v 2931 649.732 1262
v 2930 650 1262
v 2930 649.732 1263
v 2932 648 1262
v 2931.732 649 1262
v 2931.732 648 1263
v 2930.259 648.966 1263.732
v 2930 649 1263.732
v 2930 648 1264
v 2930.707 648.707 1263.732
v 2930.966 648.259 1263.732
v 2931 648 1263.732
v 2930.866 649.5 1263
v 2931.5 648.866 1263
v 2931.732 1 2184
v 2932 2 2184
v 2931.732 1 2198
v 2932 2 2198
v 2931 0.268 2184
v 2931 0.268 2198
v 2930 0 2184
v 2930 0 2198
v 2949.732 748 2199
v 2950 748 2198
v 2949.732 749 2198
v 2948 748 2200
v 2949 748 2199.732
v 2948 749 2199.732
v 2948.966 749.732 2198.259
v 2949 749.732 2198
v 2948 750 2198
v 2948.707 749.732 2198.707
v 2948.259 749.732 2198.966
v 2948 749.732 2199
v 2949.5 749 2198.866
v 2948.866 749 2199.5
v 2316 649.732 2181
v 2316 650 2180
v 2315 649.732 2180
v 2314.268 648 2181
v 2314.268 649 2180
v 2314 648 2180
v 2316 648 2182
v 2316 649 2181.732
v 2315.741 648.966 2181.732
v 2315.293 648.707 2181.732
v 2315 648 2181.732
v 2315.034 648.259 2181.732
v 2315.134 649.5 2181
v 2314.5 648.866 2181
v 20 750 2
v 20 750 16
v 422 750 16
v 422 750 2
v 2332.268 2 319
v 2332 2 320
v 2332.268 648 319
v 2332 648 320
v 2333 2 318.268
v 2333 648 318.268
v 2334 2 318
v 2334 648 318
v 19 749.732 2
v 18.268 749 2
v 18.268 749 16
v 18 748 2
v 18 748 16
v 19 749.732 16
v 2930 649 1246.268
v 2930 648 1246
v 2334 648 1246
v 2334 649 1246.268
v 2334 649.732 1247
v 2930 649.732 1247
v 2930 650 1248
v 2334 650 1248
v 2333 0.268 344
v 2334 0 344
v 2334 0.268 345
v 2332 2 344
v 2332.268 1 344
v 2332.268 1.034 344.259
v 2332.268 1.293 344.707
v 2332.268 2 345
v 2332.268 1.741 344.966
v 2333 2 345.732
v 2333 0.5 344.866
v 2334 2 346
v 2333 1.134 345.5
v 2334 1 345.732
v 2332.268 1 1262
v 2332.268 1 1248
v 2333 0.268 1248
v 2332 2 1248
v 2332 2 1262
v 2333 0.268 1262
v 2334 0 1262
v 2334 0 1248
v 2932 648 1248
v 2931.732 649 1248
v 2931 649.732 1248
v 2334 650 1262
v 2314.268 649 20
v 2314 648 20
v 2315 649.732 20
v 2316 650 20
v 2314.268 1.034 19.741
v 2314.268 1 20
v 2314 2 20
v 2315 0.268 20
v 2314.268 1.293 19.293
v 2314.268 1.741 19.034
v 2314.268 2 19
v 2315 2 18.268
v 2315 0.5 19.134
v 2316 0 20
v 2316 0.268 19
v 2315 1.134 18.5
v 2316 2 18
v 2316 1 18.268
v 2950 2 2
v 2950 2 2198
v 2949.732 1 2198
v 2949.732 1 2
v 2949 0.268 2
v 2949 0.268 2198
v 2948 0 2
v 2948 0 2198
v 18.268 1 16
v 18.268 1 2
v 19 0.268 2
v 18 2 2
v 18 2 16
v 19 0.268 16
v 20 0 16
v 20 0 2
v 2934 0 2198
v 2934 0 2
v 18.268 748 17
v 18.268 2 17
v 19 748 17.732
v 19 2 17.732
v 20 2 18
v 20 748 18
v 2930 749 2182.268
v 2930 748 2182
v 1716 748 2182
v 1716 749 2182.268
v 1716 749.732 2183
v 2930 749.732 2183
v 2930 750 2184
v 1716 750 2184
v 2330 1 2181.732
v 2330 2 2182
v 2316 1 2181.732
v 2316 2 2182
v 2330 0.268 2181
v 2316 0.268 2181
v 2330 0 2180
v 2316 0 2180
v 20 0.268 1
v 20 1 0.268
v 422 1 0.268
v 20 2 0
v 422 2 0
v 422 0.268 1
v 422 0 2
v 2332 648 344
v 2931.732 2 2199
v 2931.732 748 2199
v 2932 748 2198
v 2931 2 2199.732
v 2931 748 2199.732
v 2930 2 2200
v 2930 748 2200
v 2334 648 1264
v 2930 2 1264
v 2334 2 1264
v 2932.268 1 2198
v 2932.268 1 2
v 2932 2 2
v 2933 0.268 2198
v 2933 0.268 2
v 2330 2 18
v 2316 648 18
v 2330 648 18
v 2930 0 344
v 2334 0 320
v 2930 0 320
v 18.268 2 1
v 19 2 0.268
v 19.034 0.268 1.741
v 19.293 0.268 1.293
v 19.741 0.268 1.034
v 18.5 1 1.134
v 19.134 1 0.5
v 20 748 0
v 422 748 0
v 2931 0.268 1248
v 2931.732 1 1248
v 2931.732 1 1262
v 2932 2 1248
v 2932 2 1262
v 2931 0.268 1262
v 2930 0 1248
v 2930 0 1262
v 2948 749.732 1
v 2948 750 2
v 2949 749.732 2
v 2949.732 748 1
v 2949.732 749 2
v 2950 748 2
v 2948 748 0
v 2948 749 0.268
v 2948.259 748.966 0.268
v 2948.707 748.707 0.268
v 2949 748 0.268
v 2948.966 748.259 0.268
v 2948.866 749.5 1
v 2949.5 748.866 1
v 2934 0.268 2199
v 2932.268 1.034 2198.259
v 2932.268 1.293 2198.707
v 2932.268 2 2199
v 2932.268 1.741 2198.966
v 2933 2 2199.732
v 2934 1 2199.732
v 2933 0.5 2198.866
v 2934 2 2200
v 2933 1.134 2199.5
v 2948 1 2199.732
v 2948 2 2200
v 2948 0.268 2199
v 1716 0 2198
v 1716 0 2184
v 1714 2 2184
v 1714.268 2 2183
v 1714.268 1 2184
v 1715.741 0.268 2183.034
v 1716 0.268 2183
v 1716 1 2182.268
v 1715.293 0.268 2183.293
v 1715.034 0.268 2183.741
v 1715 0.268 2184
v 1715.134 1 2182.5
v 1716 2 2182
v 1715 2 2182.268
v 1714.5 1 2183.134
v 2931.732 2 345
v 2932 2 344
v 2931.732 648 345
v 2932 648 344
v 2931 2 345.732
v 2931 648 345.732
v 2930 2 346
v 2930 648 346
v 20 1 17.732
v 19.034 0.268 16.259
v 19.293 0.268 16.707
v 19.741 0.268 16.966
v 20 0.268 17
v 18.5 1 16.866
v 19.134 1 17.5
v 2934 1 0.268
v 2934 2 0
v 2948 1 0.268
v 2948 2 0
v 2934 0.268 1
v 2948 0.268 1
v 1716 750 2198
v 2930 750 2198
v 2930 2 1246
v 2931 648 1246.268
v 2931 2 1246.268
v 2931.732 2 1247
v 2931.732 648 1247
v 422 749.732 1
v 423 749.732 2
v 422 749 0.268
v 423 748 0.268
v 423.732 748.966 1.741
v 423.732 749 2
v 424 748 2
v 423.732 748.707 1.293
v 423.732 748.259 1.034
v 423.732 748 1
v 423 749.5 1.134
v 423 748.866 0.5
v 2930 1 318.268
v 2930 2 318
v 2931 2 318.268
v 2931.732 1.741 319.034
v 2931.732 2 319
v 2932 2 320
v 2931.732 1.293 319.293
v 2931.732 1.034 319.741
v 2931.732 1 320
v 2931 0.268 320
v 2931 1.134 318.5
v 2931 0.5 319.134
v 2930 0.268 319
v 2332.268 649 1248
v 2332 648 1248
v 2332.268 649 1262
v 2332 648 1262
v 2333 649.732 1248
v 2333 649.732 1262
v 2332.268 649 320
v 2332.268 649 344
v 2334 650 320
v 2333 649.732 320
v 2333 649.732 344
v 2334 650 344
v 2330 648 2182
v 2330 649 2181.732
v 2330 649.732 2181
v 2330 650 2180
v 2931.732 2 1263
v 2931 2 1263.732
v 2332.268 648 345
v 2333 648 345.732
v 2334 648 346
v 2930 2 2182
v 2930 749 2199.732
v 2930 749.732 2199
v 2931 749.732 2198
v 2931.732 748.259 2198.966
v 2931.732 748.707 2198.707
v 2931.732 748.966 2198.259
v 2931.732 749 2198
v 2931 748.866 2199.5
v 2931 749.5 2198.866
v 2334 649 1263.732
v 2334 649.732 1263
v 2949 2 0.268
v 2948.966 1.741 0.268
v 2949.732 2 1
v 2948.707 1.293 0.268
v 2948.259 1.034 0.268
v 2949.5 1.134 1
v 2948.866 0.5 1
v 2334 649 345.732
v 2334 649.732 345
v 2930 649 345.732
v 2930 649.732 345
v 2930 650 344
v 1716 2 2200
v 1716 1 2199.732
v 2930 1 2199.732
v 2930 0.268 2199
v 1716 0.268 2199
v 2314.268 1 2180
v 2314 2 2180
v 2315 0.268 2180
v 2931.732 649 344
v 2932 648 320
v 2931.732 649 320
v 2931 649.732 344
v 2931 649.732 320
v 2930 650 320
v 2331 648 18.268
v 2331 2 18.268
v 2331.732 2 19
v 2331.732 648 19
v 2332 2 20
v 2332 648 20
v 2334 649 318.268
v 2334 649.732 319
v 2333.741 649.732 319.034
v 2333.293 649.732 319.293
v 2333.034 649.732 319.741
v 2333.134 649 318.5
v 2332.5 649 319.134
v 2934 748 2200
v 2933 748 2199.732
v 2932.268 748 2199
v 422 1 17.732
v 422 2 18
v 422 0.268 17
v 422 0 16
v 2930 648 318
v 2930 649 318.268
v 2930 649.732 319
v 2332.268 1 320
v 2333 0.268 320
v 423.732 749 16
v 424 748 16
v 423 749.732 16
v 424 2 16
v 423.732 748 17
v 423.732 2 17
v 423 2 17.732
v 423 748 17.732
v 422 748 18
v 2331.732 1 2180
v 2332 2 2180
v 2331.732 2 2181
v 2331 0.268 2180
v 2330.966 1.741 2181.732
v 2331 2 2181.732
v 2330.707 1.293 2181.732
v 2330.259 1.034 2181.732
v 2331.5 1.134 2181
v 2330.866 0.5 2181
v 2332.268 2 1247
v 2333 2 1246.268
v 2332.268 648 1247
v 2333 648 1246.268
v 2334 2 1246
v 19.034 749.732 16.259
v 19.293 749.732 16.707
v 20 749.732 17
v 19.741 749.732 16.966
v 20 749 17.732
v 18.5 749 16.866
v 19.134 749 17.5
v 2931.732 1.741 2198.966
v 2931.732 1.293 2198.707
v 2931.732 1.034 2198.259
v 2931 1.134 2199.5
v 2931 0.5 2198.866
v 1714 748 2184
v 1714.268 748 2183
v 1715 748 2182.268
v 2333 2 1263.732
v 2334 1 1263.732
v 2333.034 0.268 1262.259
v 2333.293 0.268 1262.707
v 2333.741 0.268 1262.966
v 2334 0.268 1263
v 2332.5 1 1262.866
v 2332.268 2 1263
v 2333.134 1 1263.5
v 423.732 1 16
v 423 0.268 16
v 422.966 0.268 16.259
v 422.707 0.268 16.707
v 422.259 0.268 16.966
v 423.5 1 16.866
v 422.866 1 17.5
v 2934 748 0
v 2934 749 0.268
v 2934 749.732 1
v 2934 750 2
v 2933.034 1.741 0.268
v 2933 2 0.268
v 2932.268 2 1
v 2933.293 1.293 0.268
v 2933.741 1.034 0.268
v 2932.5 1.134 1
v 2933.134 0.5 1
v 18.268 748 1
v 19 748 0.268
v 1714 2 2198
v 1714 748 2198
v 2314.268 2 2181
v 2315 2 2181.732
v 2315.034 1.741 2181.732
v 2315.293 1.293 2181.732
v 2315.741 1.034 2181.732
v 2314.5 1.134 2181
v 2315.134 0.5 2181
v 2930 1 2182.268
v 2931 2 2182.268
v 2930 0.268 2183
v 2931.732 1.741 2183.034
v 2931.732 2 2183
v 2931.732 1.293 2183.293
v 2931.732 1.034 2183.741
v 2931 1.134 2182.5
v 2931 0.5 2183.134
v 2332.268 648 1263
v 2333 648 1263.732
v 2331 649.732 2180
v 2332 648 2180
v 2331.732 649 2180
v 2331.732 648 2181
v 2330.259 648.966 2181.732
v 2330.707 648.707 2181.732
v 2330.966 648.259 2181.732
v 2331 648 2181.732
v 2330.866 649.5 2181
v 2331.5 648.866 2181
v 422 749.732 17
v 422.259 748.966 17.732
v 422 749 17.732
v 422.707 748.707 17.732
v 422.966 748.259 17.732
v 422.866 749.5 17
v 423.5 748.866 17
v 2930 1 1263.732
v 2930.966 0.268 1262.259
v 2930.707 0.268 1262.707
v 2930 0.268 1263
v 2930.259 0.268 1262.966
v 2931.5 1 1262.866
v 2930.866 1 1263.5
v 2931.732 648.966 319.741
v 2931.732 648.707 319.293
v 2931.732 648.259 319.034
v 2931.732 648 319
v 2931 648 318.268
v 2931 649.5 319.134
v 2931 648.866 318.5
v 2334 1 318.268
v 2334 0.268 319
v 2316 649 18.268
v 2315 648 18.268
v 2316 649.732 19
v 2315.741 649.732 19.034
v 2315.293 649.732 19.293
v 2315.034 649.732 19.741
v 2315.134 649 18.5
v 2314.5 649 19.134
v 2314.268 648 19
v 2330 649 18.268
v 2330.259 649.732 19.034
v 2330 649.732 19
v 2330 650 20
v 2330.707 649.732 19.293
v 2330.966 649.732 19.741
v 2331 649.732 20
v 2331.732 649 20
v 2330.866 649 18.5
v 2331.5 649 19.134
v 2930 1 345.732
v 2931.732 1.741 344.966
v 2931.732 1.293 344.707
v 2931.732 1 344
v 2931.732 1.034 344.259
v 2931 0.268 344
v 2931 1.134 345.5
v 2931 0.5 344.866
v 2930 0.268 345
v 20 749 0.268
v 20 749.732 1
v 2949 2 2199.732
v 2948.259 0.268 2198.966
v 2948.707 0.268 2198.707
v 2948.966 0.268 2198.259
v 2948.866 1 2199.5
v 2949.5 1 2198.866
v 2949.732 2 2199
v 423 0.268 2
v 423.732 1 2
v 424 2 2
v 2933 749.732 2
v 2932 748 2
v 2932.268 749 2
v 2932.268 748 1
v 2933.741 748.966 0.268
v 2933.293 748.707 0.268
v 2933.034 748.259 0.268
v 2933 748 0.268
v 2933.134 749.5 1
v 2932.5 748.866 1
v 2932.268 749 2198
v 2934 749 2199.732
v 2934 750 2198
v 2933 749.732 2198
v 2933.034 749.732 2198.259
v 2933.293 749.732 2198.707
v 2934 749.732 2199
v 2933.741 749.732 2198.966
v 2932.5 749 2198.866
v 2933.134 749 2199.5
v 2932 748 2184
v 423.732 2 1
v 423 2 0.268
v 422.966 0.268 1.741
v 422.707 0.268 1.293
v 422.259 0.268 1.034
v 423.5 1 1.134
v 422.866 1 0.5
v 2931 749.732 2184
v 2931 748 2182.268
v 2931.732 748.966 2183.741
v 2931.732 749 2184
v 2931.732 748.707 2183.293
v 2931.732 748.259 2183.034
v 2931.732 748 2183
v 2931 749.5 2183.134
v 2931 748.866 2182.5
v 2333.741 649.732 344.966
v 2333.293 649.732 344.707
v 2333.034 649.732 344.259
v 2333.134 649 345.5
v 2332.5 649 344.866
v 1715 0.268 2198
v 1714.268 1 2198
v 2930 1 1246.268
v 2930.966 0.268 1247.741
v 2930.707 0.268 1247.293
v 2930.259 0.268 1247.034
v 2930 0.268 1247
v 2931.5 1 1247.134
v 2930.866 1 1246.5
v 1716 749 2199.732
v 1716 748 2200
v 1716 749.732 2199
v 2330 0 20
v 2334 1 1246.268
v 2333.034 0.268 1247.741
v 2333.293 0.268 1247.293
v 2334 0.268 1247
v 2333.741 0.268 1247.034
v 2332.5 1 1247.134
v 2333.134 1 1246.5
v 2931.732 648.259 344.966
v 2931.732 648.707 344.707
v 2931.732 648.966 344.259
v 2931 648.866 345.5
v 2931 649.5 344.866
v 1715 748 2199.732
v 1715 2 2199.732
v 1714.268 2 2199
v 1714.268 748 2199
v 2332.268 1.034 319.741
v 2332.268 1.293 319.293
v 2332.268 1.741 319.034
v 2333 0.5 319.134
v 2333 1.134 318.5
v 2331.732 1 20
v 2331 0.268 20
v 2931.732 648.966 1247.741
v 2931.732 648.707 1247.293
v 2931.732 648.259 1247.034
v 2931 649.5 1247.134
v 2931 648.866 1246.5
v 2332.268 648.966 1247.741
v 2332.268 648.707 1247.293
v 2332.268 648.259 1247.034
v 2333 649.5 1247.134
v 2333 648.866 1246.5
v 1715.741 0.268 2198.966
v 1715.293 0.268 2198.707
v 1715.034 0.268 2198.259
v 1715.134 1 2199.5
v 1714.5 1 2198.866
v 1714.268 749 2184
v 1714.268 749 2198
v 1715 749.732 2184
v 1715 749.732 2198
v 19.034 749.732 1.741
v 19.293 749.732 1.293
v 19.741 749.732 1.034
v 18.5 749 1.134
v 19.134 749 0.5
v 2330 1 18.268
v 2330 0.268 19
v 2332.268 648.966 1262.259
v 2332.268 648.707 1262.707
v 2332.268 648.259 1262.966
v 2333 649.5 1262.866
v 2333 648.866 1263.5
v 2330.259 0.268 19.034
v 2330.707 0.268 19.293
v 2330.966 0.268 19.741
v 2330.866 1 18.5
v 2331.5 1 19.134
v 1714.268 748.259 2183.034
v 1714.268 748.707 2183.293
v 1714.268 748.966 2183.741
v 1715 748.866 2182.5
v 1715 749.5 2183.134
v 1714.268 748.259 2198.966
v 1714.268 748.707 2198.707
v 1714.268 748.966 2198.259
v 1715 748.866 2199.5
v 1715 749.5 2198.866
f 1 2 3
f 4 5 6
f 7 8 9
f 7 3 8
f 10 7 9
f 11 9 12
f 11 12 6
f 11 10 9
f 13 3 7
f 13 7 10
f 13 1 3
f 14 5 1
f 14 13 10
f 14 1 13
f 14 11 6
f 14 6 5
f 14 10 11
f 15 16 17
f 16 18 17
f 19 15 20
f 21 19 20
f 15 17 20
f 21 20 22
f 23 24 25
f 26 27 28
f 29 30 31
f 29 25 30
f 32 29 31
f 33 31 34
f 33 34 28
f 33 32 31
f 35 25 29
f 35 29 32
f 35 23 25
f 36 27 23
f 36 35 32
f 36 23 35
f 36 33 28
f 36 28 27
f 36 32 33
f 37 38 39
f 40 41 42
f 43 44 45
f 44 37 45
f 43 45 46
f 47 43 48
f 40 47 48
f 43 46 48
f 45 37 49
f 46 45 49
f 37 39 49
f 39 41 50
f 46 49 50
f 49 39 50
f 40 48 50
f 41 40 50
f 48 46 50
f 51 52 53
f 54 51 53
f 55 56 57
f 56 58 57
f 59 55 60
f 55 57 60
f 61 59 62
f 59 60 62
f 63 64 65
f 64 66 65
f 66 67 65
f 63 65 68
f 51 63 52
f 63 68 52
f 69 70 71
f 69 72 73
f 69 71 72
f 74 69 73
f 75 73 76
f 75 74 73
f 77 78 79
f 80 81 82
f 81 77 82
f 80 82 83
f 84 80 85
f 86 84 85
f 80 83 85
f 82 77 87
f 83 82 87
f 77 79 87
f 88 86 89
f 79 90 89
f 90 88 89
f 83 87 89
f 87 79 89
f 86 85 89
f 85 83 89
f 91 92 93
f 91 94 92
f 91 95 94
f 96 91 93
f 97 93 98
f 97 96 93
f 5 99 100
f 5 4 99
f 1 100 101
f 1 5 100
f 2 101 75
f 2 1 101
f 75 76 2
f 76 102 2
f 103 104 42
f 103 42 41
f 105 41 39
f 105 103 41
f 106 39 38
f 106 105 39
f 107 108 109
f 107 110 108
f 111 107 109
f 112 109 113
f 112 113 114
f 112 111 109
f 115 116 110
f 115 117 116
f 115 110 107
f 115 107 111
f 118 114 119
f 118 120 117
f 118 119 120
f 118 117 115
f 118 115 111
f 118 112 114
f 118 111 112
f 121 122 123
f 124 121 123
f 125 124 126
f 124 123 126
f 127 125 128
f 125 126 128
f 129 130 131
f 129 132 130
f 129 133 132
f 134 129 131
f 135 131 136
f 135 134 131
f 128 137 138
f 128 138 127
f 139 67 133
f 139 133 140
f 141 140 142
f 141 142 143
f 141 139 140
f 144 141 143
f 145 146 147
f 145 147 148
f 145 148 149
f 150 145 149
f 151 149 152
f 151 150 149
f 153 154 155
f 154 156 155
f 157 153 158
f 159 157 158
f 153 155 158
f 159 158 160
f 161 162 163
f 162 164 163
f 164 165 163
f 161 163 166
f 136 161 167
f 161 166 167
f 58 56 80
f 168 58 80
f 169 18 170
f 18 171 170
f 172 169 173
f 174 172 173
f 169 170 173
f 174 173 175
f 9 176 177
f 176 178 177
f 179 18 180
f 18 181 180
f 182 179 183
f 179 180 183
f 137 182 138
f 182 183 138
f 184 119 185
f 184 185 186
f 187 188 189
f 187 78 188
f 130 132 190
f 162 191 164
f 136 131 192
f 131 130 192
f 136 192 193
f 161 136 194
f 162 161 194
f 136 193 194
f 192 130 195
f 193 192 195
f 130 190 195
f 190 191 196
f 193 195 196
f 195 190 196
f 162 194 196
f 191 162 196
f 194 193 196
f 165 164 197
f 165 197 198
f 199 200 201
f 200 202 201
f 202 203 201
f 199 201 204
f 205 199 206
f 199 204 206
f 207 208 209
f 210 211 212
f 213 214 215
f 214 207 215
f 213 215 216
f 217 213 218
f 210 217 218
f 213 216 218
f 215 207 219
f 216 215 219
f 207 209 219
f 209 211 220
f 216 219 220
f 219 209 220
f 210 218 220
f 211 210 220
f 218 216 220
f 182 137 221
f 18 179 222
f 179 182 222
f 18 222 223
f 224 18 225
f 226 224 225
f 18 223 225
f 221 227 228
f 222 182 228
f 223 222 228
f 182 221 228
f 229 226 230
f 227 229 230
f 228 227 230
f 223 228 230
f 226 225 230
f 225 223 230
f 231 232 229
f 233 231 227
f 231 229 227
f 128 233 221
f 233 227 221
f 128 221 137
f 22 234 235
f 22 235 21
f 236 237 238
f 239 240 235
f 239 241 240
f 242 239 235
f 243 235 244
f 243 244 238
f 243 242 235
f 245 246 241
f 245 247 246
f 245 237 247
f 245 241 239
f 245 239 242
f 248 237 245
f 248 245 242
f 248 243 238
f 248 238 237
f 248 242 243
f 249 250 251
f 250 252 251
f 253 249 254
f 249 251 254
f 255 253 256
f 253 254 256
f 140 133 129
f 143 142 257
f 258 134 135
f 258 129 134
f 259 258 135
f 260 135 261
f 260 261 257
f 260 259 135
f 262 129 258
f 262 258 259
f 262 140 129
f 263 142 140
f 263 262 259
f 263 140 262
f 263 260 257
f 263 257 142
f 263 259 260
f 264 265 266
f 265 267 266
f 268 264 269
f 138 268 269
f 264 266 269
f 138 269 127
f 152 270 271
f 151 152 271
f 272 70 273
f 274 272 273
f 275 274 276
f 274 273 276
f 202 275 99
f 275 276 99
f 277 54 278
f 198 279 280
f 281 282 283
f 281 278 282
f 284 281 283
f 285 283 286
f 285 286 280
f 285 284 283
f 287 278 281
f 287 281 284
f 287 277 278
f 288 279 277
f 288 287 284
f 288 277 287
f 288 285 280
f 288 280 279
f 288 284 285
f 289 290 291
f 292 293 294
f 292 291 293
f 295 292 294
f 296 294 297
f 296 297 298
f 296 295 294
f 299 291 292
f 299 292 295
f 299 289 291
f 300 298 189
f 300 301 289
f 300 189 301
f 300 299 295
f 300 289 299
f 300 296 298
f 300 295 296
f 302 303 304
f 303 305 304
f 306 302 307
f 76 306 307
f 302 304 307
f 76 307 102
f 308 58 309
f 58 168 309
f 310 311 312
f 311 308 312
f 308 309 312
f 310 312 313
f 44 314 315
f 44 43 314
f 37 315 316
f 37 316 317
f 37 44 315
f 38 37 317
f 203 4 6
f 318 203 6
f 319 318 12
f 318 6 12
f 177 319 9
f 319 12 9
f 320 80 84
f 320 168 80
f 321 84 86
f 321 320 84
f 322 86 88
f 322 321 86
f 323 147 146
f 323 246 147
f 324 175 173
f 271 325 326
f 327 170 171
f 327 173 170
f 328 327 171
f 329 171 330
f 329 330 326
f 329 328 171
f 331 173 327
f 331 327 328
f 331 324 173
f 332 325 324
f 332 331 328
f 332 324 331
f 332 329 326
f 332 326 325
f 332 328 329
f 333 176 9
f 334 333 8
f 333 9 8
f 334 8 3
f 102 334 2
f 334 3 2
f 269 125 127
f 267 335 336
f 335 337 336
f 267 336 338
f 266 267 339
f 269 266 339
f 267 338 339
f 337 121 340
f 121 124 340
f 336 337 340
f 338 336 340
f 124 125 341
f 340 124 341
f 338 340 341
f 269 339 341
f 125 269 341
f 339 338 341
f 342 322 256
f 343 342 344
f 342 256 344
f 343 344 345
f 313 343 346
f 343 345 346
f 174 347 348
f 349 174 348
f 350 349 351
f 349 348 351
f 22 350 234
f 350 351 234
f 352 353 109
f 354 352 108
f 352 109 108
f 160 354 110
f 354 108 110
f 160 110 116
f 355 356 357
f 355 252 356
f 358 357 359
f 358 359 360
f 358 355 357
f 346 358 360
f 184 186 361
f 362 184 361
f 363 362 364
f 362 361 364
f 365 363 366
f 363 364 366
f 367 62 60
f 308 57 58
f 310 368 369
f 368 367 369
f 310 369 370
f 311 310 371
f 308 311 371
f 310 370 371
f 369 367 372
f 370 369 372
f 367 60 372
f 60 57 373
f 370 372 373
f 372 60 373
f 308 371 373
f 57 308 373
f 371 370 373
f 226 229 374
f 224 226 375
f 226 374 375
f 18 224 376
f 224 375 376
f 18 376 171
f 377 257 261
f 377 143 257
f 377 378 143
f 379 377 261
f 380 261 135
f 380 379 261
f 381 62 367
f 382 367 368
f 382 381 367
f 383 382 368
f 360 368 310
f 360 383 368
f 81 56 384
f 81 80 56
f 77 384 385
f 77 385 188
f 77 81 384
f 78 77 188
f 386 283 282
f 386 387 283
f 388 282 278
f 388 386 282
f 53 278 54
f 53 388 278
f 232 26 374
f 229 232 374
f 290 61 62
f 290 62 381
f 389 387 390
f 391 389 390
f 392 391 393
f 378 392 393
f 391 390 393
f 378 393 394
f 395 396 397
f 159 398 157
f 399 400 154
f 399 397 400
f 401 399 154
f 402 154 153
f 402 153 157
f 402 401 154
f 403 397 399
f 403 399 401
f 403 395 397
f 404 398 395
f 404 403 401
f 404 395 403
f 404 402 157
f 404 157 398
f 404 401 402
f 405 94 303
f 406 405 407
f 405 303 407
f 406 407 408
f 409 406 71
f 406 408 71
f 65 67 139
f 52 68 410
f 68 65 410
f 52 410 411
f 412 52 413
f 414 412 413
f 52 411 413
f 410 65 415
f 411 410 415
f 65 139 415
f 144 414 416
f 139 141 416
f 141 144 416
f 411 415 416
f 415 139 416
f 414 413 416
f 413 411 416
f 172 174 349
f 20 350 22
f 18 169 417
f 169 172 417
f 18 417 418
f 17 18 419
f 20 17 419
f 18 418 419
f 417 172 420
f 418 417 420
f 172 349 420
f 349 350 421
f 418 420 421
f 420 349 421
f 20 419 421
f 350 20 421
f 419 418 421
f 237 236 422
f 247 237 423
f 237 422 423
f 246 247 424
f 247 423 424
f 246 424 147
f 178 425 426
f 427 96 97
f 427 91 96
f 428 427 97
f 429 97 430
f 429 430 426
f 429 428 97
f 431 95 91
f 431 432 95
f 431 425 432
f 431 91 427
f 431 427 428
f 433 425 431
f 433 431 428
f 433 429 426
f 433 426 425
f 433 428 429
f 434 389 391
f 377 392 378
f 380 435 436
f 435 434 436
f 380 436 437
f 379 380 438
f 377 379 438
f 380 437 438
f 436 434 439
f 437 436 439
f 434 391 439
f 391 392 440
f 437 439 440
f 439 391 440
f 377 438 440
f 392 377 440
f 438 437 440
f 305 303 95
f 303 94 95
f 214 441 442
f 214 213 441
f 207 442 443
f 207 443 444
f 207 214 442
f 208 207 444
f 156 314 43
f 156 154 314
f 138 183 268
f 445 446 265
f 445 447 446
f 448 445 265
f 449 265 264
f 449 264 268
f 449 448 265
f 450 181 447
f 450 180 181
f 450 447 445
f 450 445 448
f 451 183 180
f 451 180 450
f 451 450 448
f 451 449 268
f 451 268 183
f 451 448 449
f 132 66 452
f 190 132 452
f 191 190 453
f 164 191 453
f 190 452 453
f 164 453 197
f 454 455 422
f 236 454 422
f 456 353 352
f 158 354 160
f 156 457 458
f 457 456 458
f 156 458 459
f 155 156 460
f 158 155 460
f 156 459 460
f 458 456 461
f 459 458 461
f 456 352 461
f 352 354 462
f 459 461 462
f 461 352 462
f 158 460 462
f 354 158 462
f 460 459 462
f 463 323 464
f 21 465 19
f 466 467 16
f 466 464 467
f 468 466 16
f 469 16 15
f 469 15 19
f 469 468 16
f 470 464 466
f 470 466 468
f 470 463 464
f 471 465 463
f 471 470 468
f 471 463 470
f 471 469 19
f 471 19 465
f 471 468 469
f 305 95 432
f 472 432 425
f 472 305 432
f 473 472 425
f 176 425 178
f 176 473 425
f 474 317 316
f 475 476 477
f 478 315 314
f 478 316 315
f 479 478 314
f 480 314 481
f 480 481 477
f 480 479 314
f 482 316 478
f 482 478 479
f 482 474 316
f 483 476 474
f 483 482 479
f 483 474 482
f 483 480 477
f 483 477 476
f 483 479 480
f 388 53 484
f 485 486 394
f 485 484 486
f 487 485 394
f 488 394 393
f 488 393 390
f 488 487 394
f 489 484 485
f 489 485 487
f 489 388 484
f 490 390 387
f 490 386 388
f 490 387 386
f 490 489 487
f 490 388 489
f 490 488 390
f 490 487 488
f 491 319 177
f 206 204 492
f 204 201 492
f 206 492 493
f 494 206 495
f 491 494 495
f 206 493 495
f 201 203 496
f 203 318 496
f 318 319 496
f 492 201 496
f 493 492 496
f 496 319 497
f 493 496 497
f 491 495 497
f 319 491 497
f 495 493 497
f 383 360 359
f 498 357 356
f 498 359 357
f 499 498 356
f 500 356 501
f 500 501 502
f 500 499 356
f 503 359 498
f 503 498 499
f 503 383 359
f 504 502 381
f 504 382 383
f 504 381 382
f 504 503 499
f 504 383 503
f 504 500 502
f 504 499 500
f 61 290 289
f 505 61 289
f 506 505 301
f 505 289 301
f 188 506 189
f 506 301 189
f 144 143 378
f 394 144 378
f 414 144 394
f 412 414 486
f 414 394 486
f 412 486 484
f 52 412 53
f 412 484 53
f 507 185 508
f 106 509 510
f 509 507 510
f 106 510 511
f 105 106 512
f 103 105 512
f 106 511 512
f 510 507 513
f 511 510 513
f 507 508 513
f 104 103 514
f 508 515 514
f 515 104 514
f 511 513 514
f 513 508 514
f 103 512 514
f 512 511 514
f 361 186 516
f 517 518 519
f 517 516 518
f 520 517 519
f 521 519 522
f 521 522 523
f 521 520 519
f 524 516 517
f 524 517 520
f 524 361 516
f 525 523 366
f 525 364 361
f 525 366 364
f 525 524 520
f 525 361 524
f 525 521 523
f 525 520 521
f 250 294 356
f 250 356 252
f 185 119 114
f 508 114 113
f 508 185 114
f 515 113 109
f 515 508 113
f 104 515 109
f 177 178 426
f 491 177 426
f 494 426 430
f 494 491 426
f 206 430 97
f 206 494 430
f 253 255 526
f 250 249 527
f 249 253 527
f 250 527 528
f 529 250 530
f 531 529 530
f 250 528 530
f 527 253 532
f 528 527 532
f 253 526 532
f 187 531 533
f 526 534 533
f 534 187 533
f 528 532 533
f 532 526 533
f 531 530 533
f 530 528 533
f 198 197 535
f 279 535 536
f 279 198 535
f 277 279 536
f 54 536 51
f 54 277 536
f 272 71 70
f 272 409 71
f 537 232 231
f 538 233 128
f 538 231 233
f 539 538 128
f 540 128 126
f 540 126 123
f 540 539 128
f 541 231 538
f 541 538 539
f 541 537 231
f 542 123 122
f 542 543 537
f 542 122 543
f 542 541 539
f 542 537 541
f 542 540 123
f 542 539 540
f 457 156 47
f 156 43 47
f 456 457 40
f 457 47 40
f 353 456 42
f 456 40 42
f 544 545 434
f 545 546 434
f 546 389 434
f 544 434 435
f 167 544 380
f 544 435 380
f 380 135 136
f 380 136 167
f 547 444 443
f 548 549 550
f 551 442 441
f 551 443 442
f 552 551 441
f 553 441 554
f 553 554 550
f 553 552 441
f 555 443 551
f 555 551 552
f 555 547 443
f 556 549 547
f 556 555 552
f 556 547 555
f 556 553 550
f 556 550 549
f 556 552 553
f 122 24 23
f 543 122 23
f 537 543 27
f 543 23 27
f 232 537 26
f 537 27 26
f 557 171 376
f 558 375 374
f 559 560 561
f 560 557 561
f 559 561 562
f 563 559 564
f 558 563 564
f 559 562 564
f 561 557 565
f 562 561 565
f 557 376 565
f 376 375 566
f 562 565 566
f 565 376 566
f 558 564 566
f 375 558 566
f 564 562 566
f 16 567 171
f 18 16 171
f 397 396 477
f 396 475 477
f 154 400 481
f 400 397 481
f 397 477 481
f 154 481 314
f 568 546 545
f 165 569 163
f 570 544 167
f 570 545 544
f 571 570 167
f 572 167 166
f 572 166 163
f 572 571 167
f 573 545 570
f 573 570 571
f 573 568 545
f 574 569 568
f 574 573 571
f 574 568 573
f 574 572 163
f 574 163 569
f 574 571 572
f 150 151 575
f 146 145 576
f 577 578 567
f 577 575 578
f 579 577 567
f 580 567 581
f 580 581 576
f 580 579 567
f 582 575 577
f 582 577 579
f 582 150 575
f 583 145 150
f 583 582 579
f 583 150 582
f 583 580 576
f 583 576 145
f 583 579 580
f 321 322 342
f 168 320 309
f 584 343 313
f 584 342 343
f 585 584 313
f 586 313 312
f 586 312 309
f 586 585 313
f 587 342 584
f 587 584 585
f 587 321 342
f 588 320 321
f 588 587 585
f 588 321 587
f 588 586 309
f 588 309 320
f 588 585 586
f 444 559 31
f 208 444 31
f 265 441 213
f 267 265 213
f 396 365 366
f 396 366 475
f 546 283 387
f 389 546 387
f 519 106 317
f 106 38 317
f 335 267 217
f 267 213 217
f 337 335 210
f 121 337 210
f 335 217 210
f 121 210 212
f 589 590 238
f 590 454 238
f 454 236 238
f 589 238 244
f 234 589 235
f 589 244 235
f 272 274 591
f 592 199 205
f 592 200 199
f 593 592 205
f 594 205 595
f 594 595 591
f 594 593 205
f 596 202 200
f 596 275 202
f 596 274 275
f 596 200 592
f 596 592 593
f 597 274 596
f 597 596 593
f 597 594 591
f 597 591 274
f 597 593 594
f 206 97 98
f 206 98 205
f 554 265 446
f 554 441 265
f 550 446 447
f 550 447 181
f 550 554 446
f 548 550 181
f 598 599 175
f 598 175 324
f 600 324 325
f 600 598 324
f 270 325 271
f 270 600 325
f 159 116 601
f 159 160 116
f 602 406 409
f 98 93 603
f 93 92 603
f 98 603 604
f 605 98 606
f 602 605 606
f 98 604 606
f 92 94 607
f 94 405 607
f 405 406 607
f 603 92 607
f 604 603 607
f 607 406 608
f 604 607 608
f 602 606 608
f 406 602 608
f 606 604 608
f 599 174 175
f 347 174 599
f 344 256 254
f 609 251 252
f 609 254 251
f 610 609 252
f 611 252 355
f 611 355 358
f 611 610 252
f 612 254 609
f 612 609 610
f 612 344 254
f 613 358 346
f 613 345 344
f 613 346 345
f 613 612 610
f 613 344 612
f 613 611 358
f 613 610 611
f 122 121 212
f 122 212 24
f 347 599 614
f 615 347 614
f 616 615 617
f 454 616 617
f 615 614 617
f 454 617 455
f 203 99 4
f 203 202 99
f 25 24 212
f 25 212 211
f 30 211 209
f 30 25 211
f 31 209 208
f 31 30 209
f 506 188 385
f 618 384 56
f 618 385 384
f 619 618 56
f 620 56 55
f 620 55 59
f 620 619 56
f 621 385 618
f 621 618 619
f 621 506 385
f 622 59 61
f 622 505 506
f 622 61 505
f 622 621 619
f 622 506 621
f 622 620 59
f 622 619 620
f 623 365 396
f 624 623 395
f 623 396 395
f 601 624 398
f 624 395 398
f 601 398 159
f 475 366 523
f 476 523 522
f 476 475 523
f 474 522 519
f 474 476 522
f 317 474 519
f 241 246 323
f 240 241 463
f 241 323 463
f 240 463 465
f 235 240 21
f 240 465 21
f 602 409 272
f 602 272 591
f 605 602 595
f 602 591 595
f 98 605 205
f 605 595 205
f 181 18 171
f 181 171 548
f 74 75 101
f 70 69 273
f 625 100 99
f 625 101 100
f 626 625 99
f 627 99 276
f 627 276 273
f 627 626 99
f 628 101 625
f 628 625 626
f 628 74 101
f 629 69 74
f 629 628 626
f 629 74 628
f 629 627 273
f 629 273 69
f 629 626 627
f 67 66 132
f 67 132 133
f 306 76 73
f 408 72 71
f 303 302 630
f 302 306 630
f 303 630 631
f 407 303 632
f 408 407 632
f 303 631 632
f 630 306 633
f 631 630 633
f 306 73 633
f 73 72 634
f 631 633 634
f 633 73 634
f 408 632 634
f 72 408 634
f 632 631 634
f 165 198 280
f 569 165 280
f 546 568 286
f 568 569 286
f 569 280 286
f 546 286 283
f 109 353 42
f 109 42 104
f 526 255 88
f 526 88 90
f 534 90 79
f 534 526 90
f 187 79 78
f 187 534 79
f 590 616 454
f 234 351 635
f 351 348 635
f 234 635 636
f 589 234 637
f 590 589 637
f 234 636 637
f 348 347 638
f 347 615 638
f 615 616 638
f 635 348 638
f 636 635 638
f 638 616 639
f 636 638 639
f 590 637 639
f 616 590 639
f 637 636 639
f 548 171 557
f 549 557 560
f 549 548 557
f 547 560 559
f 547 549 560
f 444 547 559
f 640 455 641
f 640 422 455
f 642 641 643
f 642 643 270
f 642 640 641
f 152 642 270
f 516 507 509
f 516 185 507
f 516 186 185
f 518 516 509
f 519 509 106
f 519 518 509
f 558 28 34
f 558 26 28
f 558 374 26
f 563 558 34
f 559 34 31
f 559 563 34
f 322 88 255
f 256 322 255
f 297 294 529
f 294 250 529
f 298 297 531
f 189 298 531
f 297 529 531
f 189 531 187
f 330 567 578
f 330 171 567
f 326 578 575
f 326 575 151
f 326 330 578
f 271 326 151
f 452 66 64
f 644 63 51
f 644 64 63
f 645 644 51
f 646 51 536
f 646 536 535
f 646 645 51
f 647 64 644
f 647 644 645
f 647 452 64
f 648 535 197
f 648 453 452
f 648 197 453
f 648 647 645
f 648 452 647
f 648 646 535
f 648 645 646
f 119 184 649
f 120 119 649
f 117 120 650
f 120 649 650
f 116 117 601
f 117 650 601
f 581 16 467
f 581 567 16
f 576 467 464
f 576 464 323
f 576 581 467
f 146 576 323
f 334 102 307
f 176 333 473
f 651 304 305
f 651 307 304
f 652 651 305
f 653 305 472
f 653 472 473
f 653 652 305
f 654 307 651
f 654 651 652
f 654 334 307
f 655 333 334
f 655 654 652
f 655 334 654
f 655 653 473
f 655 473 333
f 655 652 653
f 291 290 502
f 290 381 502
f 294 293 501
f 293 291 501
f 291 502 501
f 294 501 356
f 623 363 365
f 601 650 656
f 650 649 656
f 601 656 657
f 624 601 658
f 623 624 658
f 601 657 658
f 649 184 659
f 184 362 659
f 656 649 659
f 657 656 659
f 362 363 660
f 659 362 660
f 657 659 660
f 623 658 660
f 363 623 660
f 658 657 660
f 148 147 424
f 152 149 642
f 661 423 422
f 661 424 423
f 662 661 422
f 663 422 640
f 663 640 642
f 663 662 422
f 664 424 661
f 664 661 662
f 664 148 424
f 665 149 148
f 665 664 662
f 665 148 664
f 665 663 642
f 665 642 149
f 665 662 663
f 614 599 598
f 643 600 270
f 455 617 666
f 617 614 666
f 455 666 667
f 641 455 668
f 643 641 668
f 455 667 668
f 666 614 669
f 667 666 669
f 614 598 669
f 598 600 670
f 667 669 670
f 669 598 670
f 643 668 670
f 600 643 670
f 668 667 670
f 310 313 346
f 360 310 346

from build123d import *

# Parameters (mm, degrees)
F1_DEPTH = 750
F0_W     = 600
F0_H     = 28
F2_DEPTH = 650
F0_H_2   = 18
F3_DEPTH = 650
F4_DEPTH = 750
F5_DEPTH = 650
F0_W_2   = 406
F6_DEPTH = 750
F7_R     = 2
F8_R     = 2
F8_2_R   = 2
F9_R     = 2
F10_R    = 2
F11_R    = 2


with BuildPart() as f1:
    # F0 (on Front) → F1 (new body)
    with BuildSketch(Plane.XZ):
        Polygon((2932, 0), (2950, 0), (2950, 2200), (2932, 2200), (2932, 2182), (2932, 1362), (2932, 1344), (2932, 1264), (2932, 1246), (2932, 346), (2932, 318), (2932, 18), align=None)
    extrude(amount=-F1_DEPTH)

    # F8
    f8_edges = [f1.edges().sort_by_distance(p)[0] for p in [
        (2950, 375, 2200),
        (2941, 0, 2200),
        (2950, 0, 1100),
        (2932, 0, 1100),
        (2932, 375, 2200),
        (2950, 750, 1100),
        (2932, 750, 1100),
        (2941, 750, 2200),
        (2941, 750, 0),
        (2950, 375, 0),
        (2932, 375, 0),
        (2941, 0, 0),
    ]]
    fillet(f8_edges, radius=F8_R)


with BuildPart() as f2:
    # F0 (on Front) → F2 (new body)
    with BuildSketch(Plane.XZ):
        with Locations((2632, 332)):
            Rectangle(F0_W, F0_H)
    extrude(amount=-F2_DEPTH)

    # F9
    f9_edges = [f2.edges().sort_by_distance(p)[0] for p in [
        (2632, 0, 318),
        (2632, 0, 346),
        (2332, 0, 332),
        (2332, 325, 346),
        (2332, 325, 318),
        (2632, 650, 346),
        (2632, 650, 318),
        (2332, 650, 332),
        (2932, 325, 346),
        (2932, 650, 332),
        (2932, 325, 318),
        (2932, 0, 332),
    ]]
    fillet(f9_edges, radius=F9_R)


with BuildPart() as f3:
    # F0 (on Front) → F3 (new body)
    with BuildSketch(Plane.XZ):
        with Locations((2632, 1255)):
            Rectangle(F0_W, F0_H_2)
    extrude(amount=-F3_DEPTH)

    # F10
    f10_edges = [f3.edges().sort_by_distance(p)[0] for p in [
        (2632, 650, 1246),
        (2932, 650, 1255),
        (2632, 650, 1264),
        (2332, 650, 1255),
        (2932, 325, 1246),
        (2932, 325, 1264),
        (2932, 0, 1255),
        (2332, 325, 1264),
        (2332, 325, 1246),
        (2332, 0, 1255),
        (2632, 0, 1246),
        (2632, 0, 1264),
    ]]
    fillet(f10_edges, radius=F10_R)


with BuildPart() as f4:
    # F0 (on Front) → F4 (new body)
    with BuildSketch(Plane.XZ):
        Polygon((2932, 2182), (2932, 2200), (1714, 2200), (1714, 2182), (2314, 2182), (2332, 2182), align=None)
    extrude(amount=-F4_DEPTH)

    # F7
    f7_edges = [f4.edges().sort_by_distance(p)[0] for p in [
        (2323, 750, 2200),
        (1714, 375, 2200),
        (2323, 750, 2182),
        (1714, 375, 2182),
        (2323, 0, 2200),
        (2323, 0, 2182),
        (1714, 0, 2191),
        (1714, 750, 2191),
        (2932, 375, 2200),
        (2932, 750, 2191),
        (2932, 375, 2182),
        (2932, 0, 2191),
    ]]
    fillet(f7_edges, radius=F7_R)


with BuildPart() as f5:
    # F0 (on Front) → F5 (new body)
    with BuildSketch(Plane.XZ):
        Polygon((2314, 18), (2332, 18), (2332, 318), (2332, 346), (2332, 1246), (2332, 1264), (2332, 1344), (2332, 1362), (2332, 2182), (2314, 2182), (2314, 1362), (2314, 1344), (2314, 1264), (2314, 1246), (2314, 346), (2314, 318), align=None)
    extrude(amount=-F5_DEPTH)

    # F8#2
    f8_2_edges = [f5.edges().sort_by_distance(p)[0] for p in [
        (2332, 325, 18),
        (2323, 0, 18),
        (2314, 0, 1100),
        (2314, 325, 18),
        (2332, 0, 1100),
        (2323, 650, 18),
        (2314, 650, 1100),
        (2332, 650, 1100),
        (2323, 650, 2182),
        (2314, 325, 2182),
        (2332, 325, 2182),
        (2323, 0, 2182),
    ]]
    fillet(f8_2_edges, radius=F8_2_R)


with BuildPart() as f6:
    # F0 (on Front) → F6 (new body)
    with BuildSketch(Plane.XZ):
        with Locations((221, 9)):
            Rectangle(F0_W_2, F0_H_2)
    extrude(amount=-F6_DEPTH)

    # F11
    f11_edges = [f6.edges().sort_by_distance(p)[0] for p in [
        (18, 375, 18),
        (18, 375, 0),
        (18, 0, 9),
        (18, 750, 9),
        (221, 750, 0),
        (424, 750, 9),
        (221, 750, 18),
        (424, 375, 0),
        (424, 375, 18),
        (424, 0, 9),
        (221, 0, 0),
        (221, 0, 18),
    ]]
    fillet(f11_edges, radius=F11_R)


solid = Compound([f1.part, f2.part, f3.part, f4.part, f5.part, f6.part])
